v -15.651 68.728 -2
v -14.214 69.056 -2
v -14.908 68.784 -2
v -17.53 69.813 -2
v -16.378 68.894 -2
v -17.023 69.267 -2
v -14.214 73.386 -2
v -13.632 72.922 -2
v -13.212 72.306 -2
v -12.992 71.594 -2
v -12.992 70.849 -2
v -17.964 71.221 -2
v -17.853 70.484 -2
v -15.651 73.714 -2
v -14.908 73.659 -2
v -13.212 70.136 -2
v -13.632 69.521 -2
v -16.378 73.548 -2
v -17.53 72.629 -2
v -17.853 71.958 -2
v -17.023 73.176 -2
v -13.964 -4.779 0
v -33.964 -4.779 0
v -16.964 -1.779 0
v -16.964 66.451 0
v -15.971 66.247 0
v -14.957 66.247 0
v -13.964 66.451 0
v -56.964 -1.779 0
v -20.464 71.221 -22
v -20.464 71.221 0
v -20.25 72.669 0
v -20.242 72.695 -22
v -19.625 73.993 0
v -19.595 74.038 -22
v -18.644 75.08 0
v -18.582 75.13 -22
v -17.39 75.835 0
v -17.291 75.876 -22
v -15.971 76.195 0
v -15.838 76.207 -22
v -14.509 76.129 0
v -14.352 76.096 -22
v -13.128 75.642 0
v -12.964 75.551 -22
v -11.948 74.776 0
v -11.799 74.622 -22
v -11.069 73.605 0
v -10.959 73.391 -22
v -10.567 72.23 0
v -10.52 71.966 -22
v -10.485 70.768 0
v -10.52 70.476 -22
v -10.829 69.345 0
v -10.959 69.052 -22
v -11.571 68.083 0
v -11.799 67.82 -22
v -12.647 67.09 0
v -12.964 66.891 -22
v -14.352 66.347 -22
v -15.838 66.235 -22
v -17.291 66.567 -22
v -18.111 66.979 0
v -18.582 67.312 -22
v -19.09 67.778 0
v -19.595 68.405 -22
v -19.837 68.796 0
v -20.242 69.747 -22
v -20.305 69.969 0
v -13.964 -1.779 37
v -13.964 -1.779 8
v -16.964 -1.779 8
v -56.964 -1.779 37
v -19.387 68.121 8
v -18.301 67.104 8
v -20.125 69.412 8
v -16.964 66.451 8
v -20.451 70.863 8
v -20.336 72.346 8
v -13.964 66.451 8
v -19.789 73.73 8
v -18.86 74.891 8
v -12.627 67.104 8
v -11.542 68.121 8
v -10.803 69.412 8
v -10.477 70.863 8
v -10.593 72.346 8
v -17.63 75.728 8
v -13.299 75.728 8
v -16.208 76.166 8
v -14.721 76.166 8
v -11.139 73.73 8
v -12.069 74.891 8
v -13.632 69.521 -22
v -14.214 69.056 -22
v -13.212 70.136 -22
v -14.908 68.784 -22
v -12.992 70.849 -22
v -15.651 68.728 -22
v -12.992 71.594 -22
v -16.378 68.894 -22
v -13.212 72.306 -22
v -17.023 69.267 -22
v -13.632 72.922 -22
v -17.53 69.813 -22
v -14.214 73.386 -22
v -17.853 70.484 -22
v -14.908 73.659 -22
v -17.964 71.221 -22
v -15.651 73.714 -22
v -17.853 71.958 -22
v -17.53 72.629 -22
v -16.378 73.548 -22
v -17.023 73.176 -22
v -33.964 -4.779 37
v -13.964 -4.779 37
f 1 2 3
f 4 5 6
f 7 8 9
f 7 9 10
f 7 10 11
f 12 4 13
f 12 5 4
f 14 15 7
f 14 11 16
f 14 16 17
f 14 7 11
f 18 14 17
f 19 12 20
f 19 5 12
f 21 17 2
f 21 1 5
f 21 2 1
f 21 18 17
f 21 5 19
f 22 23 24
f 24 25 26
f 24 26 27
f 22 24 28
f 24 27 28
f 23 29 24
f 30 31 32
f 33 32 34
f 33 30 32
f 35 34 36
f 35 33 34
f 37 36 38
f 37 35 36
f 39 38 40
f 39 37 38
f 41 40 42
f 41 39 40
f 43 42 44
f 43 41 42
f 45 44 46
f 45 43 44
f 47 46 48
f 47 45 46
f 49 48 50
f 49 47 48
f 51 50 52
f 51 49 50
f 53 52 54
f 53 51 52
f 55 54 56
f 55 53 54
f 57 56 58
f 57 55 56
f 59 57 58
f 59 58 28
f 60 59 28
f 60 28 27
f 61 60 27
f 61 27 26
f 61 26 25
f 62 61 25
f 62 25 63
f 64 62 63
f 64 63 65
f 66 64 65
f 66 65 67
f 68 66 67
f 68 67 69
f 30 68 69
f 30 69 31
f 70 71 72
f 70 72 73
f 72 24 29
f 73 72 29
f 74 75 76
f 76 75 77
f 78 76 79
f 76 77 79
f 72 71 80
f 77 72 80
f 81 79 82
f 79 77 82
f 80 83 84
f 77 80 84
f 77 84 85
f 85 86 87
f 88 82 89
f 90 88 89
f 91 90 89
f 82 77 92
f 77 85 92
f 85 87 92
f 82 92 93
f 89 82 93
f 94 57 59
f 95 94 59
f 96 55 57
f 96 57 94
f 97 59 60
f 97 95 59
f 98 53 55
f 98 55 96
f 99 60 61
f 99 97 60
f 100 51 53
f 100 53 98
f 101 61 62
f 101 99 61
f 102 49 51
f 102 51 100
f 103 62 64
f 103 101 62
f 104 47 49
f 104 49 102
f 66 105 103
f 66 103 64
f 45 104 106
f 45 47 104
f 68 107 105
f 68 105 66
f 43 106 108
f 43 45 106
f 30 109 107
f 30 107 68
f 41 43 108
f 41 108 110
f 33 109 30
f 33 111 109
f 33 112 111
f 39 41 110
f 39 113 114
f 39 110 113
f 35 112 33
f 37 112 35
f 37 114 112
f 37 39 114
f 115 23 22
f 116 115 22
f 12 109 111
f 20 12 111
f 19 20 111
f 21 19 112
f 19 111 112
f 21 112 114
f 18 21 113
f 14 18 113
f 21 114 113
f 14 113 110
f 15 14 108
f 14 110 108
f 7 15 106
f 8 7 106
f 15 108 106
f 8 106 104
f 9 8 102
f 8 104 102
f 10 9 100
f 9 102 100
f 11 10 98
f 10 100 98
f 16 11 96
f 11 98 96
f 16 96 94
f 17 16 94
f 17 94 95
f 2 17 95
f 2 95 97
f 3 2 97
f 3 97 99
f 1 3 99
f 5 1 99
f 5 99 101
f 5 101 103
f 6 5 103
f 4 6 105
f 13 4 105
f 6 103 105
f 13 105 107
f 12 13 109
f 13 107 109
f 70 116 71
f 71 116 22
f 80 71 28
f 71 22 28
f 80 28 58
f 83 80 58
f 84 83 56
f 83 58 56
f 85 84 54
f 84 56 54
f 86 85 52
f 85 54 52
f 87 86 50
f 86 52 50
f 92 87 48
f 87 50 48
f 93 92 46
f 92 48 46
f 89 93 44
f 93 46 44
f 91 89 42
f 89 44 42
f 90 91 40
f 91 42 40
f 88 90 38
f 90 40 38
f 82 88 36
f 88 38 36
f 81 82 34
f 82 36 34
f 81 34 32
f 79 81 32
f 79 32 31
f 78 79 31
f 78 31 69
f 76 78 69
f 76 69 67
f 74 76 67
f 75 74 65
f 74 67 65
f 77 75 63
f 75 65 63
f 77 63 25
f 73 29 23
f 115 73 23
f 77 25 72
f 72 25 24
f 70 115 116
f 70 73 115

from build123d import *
from build123d.topology import SkipClean

# Parameters (mm, degrees)
EXTRUDE_1_DEPTH     = 37
SKETCH_8_W          = 29
SKETCH_8_H          = 78
CUT_EXTRUDE_3_DEPTH = 10
EXTRUDE_START       = 22
SKETCH_10_R         = 5
EXTRUDE_4_DEPTH     = 22
SKETCH_11_R         = 2.5
CUT_EXTRUDE_4_DEPTH = 20


with BuildPart() as part:
    # 草图1 → 凸台-拉伸1 (new body)
    with BuildSketch(Plane.XY):
        with BuildLine():
            Line((-19.714285714, -1.778812154), (-56.964285714, -1.778812154))
            Line((-56.964285714, -1.778812154), (-33.964285714, -4.778812154))
            Line((-33.964285714, -4.778812154), (-13.964285714, -4.778812154))
            Line((-13.964285714, -4.778812154), (-13.964285714, 66.451491839))
            ThreePointArc((-13.964285714, 66.451491839), (-15.464285714, 76.221187846), (-16.964285714, 66.451491839))
            Line((-16.964285714, 66.451491839), (-16.964285714, -1.778812154))
            Line((-16.964285714, -1.778812154), (-19.714285714, -1.778812154))
        make_face()
    extrude(amount=EXTRUDE_1_DEPTH)

    # 草图8 → 切除-拉伸3 (cut, symmetric)
    with BuildSketch(Plane(origin=(-13.964285714, 0, 0), x_dir=(0, 0, -1), z_dir=(1, 0, 0))):
        with Locations((-22.5, 37.221187846)):
            Rectangle(SKETCH_8_W, SKETCH_8_H)
    extrude(amount=CUT_EXTRUDE_3_DEPTH, both=True, mode=Mode.SUBTRACT)

    # 草图10 → 凸台-拉伸4 (add)
    with SkipClean():  # the faces are left unmerged after this step: merging them gives an invalid solid
        with BuildSketch(Plane(origin=(0, 0, 0), x_dir=(-1, 0, 0), z_dir=(0, 0, -1)).offset(EXTRUDE_START)):
            with Locations((15.464285714, 71.221187846)):
                Circle(SKETCH_10_R)
        extrude(amount=-EXTRUDE_4_DEPTH)

    # 草图11 → 切除-拉伸4 (cut)
    with SkipClean():  # the faces are left unmerged after this step: merging them gives an invalid solid
        with BuildSketch(Plane(origin=(0, 0, -22), x_dir=(-1, 0, 0), z_dir=(0, 0, -1))):
            with Locations((15.464285714, 71.221187846)):
                Circle(SKETCH_11_R)
        extrude(amount=-CUT_EXTRUDE_4_DEPTH, mode=Mode.SUBTRACT)


solid = part.part
